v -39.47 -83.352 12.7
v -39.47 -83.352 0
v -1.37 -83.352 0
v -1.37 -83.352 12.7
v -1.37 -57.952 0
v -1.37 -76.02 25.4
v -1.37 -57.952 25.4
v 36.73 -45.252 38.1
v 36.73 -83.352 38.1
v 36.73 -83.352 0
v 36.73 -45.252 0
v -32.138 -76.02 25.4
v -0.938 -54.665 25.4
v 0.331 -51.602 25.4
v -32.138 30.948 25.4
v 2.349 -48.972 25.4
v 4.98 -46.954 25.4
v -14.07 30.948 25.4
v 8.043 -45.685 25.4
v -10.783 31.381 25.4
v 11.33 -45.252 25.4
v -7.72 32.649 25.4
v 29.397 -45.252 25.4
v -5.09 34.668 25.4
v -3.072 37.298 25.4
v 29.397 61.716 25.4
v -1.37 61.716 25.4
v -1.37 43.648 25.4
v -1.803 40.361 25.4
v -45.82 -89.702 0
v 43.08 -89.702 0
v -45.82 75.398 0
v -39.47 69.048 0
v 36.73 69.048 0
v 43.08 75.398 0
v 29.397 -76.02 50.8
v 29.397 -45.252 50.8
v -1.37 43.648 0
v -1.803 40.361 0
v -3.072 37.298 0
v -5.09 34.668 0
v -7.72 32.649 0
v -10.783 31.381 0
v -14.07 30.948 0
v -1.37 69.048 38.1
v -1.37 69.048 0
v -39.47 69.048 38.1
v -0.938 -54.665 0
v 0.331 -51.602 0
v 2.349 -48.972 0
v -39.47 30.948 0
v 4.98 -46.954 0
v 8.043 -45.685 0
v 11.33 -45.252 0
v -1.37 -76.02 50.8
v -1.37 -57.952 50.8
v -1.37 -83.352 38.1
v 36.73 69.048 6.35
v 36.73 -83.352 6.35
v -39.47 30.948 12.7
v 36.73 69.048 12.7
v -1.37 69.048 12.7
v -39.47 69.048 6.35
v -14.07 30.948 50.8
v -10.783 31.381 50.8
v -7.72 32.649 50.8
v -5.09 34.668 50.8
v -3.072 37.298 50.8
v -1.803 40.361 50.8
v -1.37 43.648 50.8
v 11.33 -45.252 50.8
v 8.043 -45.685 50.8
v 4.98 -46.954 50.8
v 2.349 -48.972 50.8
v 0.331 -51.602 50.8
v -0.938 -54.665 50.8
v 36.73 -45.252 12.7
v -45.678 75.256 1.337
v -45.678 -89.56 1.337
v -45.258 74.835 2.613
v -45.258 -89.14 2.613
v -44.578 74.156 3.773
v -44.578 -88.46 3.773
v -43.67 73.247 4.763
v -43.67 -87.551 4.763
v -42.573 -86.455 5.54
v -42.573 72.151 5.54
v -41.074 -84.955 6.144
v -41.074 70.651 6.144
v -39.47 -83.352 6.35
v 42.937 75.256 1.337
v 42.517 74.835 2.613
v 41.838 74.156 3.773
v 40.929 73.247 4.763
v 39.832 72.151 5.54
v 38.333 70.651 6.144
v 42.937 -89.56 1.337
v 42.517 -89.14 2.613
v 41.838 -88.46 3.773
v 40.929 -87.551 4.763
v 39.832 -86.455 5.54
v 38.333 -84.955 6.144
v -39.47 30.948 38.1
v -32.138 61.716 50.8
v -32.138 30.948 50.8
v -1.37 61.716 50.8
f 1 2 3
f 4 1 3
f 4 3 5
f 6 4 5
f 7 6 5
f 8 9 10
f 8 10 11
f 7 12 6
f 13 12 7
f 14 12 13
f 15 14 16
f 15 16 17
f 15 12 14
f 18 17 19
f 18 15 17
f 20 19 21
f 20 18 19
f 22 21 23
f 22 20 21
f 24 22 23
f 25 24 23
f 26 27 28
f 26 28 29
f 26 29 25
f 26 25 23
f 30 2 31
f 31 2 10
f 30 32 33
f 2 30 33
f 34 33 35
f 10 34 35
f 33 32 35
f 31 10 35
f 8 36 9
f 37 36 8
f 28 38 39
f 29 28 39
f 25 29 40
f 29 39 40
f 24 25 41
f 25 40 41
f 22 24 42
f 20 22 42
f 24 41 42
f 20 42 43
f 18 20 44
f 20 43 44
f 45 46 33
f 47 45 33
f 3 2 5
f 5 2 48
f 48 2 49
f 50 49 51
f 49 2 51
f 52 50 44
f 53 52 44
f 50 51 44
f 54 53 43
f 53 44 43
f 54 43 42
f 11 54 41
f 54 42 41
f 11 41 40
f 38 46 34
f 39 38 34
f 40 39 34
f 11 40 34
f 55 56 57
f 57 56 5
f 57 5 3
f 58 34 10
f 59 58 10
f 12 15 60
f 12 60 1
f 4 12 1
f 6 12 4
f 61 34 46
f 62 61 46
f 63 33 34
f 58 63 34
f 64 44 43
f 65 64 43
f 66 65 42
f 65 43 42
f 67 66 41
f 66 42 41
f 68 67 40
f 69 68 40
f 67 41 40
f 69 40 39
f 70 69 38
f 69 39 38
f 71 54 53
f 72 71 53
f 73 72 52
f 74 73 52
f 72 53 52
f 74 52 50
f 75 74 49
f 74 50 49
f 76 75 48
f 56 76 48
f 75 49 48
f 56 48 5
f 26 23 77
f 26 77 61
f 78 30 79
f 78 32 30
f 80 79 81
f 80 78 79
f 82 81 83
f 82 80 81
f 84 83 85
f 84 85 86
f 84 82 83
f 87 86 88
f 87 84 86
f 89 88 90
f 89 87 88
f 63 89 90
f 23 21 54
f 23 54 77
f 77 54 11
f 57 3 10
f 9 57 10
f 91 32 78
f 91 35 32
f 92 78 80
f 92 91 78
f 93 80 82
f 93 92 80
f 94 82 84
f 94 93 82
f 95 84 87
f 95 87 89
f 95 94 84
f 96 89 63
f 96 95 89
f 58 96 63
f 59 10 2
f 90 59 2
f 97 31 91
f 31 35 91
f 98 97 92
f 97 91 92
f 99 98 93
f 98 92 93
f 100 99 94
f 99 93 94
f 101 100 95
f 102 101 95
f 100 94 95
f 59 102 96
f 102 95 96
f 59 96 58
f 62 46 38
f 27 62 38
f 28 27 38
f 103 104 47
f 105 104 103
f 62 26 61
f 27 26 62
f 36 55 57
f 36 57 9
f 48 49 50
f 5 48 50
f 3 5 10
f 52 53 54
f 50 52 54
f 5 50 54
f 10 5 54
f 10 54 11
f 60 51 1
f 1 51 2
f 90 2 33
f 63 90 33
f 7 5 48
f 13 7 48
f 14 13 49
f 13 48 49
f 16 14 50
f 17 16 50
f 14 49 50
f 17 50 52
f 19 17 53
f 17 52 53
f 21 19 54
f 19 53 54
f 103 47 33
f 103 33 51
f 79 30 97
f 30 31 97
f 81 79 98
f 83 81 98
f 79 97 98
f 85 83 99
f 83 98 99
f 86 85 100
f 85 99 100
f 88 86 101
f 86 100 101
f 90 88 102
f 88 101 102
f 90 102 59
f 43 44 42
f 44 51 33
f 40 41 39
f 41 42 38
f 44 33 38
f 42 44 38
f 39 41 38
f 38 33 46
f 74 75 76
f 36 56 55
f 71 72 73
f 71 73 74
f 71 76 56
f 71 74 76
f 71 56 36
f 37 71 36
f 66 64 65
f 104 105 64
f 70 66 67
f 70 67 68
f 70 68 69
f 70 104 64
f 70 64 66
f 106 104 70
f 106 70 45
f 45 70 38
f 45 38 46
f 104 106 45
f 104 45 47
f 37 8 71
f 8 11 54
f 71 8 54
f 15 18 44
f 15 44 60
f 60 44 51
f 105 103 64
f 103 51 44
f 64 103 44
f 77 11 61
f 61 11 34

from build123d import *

# Parameters (mm, degrees)
F0_W       = 88.9
F0_H       = 165.1
F1_DEPTH   = 6.35
F2_DEPTH   = 25.4
F3_DEPTH   = 50.8
F4_R       = 6.34999
F5_SIZE2   = 7.3323484187
F5_SIZE    = 12.7
F5_2_SIZE2 = 7.3323484187
F5_2_SIZE  = 12.7
F6_SIZE2   = 7.3323484187
F6_SIZE    = 12.7


# Not quite as in the source:
# - a fillet or chamfer is up to 0.001 mm smaller than in the source, because OpenCascade refuses the exact size


with BuildPart() as f1:
    # F0 (on Top) → F1 (new body)
    with BuildSketch(Plane.XY):
        with Locations((-1.3702638615, -7.1521108847)):
            Rectangle(F0_W, F0_H)
        Polygon((-1.3702638615, -83.3521108847), (-39.4702638615, -83.3521108847), (-39.4702638615, 30.9478891153), (-39.4702638615, 69.0478891153), (-1.3702638615, 69.0478891153), (36.7297361385, 69.0478891153), (36.7297361385, -45.2521108847), (36.7297361385, -83.3521108847), align=None, mode=Mode.SUBTRACT)
    extrude(amount=F1_DEPTH)

    # F4 (radius 6.35 in the source; OpenCascade refuses exactly that, so slightly less here)
    f4_edges = [f1.edges().sort_by_distance(p)[0] for p in [
        (-1.370264, -89.702111, 6.35),
        (43.079736, -7.152111, 6.35),
        (-45.820264, -7.152111, 6.35),
        (-1.370264, 75.397889, 6.35),
    ]]
    fillet(f4_edges, radius=F4_R)


with BuildPart() as f2:
    # F0 (on Top) → F2 (new body)
    with BuildSketch(Plane.XY):
        with BuildLine():
            Line((-39.4702638615, 30.9478891153), (-39.4702638615, -83.3521108847))
            Line((-39.4702638615, -83.3521108847), (-1.3702638615, -83.3521108847))
            Line((-1.3702638615, -83.3521108847), (-1.3702638615, -57.9521108847))
            ThreePointArc((-1.3702638615, -57.9521108847), (2.3494800174, -48.9718547636), (11.3297361385, -45.2521108847))
            Line((11.3297361385, -45.2521108847), (36.7297361385, -45.2521108847))
            Line((36.7297361385, -45.2521108847), (36.7297361385, 69.0478891153))
            Line((36.7297361385, 69.0478891153), (-1.3702638615, 69.0478891153))
            Line((-1.3702638615, 69.0478891153), (-1.3702638615, 43.6478891153))
            ThreePointArc((-1.3702638615, 43.6478891153), (-5.0900077404, 34.6676329943), (-14.0702638615, 30.9478891153))
            Line((-14.0702638615, 30.9478891153), (-39.4702638615, 30.9478891153))
        make_face()
    extrude(amount=F2_DEPTH)

    # F5#2
    f5_2_edges = [f2.edges().sort_by_distance(p)[0] for p in [
        (36.729736, 11.897889, 25.4),
        (17.679736, 69.047889, 25.4),
        (-39.470264, -26.202111, 25.4),
        (-20.420264, -83.352111, 25.4),
    ]]
    chamfer(f5_2_edges, length=F5_2_SIZE, length2=F5_2_SIZE2)


with BuildPart() as f3:
    # F0 (on Top) → F3 (new body)
    with BuildSketch(Plane.XY):
        with BuildLine():
            Line((-39.4702638615, 69.0478891153), (-39.4702638615, 30.9478891153))
            Line((-39.4702638615, 30.9478891153), (-14.0702638615, 30.9478891153))
            ThreePointArc((-14.0702638615, 30.9478891153), (-5.0900077404, 34.6676329943), (-1.3702638615, 43.6478891153))
            Line((-1.3702638615, 43.6478891153), (-1.3702638615, 69.0478891153))
            Line((-1.3702638615, 69.0478891153), (-39.4702638615, 69.0478891153))
        make_face()
    extrude(amount=F3_DEPTH)

    # F6
    f6_edges = [f3.edges().sort_by_distance(p)[0] for p in [
        (-20.420264, 69.047889, 50.8),
        (-39.470264, 49.997889, 50.8),
    ]]
    chamfer(f6_edges, length=F6_SIZE, length2=F6_SIZE2)


with BuildPart() as f3b:
    # F0 (on Top) → F3, piece 2 (new body)
    with BuildSketch(Plane.XY):
        with BuildLine():
            Line((-1.3702638615, -57.9521108847), (-1.3702638615, -83.3521108847))
            Line((-1.3702638615, -83.3521108847), (36.7297361385, -83.3521108847))
            Line((36.7297361385, -83.3521108847), (36.7297361385, -45.2521108847))
            Line((36.7297361385, -45.2521108847), (11.3297361385, -45.2521108847))
            ThreePointArc((11.3297361385, -45.2521108847), (2.3494800174, -48.9718547636), (-1.3702638615, -57.9521108847))
        make_face()
    extrude(amount=F3_DEPTH)

    # F5
    f5_edges = [f3b.edges().sort_by_distance(p)[0] for p in [
        (17.679736, -83.352111, 50.8),
        (36.729736, -64.302111, 50.8),
    ]]
    chamfer(f5_edges, length=F5_SIZE, length2=F5_SIZE2)


solid = Compound([f1.part, f2.part, f3.part, f3b.part])
